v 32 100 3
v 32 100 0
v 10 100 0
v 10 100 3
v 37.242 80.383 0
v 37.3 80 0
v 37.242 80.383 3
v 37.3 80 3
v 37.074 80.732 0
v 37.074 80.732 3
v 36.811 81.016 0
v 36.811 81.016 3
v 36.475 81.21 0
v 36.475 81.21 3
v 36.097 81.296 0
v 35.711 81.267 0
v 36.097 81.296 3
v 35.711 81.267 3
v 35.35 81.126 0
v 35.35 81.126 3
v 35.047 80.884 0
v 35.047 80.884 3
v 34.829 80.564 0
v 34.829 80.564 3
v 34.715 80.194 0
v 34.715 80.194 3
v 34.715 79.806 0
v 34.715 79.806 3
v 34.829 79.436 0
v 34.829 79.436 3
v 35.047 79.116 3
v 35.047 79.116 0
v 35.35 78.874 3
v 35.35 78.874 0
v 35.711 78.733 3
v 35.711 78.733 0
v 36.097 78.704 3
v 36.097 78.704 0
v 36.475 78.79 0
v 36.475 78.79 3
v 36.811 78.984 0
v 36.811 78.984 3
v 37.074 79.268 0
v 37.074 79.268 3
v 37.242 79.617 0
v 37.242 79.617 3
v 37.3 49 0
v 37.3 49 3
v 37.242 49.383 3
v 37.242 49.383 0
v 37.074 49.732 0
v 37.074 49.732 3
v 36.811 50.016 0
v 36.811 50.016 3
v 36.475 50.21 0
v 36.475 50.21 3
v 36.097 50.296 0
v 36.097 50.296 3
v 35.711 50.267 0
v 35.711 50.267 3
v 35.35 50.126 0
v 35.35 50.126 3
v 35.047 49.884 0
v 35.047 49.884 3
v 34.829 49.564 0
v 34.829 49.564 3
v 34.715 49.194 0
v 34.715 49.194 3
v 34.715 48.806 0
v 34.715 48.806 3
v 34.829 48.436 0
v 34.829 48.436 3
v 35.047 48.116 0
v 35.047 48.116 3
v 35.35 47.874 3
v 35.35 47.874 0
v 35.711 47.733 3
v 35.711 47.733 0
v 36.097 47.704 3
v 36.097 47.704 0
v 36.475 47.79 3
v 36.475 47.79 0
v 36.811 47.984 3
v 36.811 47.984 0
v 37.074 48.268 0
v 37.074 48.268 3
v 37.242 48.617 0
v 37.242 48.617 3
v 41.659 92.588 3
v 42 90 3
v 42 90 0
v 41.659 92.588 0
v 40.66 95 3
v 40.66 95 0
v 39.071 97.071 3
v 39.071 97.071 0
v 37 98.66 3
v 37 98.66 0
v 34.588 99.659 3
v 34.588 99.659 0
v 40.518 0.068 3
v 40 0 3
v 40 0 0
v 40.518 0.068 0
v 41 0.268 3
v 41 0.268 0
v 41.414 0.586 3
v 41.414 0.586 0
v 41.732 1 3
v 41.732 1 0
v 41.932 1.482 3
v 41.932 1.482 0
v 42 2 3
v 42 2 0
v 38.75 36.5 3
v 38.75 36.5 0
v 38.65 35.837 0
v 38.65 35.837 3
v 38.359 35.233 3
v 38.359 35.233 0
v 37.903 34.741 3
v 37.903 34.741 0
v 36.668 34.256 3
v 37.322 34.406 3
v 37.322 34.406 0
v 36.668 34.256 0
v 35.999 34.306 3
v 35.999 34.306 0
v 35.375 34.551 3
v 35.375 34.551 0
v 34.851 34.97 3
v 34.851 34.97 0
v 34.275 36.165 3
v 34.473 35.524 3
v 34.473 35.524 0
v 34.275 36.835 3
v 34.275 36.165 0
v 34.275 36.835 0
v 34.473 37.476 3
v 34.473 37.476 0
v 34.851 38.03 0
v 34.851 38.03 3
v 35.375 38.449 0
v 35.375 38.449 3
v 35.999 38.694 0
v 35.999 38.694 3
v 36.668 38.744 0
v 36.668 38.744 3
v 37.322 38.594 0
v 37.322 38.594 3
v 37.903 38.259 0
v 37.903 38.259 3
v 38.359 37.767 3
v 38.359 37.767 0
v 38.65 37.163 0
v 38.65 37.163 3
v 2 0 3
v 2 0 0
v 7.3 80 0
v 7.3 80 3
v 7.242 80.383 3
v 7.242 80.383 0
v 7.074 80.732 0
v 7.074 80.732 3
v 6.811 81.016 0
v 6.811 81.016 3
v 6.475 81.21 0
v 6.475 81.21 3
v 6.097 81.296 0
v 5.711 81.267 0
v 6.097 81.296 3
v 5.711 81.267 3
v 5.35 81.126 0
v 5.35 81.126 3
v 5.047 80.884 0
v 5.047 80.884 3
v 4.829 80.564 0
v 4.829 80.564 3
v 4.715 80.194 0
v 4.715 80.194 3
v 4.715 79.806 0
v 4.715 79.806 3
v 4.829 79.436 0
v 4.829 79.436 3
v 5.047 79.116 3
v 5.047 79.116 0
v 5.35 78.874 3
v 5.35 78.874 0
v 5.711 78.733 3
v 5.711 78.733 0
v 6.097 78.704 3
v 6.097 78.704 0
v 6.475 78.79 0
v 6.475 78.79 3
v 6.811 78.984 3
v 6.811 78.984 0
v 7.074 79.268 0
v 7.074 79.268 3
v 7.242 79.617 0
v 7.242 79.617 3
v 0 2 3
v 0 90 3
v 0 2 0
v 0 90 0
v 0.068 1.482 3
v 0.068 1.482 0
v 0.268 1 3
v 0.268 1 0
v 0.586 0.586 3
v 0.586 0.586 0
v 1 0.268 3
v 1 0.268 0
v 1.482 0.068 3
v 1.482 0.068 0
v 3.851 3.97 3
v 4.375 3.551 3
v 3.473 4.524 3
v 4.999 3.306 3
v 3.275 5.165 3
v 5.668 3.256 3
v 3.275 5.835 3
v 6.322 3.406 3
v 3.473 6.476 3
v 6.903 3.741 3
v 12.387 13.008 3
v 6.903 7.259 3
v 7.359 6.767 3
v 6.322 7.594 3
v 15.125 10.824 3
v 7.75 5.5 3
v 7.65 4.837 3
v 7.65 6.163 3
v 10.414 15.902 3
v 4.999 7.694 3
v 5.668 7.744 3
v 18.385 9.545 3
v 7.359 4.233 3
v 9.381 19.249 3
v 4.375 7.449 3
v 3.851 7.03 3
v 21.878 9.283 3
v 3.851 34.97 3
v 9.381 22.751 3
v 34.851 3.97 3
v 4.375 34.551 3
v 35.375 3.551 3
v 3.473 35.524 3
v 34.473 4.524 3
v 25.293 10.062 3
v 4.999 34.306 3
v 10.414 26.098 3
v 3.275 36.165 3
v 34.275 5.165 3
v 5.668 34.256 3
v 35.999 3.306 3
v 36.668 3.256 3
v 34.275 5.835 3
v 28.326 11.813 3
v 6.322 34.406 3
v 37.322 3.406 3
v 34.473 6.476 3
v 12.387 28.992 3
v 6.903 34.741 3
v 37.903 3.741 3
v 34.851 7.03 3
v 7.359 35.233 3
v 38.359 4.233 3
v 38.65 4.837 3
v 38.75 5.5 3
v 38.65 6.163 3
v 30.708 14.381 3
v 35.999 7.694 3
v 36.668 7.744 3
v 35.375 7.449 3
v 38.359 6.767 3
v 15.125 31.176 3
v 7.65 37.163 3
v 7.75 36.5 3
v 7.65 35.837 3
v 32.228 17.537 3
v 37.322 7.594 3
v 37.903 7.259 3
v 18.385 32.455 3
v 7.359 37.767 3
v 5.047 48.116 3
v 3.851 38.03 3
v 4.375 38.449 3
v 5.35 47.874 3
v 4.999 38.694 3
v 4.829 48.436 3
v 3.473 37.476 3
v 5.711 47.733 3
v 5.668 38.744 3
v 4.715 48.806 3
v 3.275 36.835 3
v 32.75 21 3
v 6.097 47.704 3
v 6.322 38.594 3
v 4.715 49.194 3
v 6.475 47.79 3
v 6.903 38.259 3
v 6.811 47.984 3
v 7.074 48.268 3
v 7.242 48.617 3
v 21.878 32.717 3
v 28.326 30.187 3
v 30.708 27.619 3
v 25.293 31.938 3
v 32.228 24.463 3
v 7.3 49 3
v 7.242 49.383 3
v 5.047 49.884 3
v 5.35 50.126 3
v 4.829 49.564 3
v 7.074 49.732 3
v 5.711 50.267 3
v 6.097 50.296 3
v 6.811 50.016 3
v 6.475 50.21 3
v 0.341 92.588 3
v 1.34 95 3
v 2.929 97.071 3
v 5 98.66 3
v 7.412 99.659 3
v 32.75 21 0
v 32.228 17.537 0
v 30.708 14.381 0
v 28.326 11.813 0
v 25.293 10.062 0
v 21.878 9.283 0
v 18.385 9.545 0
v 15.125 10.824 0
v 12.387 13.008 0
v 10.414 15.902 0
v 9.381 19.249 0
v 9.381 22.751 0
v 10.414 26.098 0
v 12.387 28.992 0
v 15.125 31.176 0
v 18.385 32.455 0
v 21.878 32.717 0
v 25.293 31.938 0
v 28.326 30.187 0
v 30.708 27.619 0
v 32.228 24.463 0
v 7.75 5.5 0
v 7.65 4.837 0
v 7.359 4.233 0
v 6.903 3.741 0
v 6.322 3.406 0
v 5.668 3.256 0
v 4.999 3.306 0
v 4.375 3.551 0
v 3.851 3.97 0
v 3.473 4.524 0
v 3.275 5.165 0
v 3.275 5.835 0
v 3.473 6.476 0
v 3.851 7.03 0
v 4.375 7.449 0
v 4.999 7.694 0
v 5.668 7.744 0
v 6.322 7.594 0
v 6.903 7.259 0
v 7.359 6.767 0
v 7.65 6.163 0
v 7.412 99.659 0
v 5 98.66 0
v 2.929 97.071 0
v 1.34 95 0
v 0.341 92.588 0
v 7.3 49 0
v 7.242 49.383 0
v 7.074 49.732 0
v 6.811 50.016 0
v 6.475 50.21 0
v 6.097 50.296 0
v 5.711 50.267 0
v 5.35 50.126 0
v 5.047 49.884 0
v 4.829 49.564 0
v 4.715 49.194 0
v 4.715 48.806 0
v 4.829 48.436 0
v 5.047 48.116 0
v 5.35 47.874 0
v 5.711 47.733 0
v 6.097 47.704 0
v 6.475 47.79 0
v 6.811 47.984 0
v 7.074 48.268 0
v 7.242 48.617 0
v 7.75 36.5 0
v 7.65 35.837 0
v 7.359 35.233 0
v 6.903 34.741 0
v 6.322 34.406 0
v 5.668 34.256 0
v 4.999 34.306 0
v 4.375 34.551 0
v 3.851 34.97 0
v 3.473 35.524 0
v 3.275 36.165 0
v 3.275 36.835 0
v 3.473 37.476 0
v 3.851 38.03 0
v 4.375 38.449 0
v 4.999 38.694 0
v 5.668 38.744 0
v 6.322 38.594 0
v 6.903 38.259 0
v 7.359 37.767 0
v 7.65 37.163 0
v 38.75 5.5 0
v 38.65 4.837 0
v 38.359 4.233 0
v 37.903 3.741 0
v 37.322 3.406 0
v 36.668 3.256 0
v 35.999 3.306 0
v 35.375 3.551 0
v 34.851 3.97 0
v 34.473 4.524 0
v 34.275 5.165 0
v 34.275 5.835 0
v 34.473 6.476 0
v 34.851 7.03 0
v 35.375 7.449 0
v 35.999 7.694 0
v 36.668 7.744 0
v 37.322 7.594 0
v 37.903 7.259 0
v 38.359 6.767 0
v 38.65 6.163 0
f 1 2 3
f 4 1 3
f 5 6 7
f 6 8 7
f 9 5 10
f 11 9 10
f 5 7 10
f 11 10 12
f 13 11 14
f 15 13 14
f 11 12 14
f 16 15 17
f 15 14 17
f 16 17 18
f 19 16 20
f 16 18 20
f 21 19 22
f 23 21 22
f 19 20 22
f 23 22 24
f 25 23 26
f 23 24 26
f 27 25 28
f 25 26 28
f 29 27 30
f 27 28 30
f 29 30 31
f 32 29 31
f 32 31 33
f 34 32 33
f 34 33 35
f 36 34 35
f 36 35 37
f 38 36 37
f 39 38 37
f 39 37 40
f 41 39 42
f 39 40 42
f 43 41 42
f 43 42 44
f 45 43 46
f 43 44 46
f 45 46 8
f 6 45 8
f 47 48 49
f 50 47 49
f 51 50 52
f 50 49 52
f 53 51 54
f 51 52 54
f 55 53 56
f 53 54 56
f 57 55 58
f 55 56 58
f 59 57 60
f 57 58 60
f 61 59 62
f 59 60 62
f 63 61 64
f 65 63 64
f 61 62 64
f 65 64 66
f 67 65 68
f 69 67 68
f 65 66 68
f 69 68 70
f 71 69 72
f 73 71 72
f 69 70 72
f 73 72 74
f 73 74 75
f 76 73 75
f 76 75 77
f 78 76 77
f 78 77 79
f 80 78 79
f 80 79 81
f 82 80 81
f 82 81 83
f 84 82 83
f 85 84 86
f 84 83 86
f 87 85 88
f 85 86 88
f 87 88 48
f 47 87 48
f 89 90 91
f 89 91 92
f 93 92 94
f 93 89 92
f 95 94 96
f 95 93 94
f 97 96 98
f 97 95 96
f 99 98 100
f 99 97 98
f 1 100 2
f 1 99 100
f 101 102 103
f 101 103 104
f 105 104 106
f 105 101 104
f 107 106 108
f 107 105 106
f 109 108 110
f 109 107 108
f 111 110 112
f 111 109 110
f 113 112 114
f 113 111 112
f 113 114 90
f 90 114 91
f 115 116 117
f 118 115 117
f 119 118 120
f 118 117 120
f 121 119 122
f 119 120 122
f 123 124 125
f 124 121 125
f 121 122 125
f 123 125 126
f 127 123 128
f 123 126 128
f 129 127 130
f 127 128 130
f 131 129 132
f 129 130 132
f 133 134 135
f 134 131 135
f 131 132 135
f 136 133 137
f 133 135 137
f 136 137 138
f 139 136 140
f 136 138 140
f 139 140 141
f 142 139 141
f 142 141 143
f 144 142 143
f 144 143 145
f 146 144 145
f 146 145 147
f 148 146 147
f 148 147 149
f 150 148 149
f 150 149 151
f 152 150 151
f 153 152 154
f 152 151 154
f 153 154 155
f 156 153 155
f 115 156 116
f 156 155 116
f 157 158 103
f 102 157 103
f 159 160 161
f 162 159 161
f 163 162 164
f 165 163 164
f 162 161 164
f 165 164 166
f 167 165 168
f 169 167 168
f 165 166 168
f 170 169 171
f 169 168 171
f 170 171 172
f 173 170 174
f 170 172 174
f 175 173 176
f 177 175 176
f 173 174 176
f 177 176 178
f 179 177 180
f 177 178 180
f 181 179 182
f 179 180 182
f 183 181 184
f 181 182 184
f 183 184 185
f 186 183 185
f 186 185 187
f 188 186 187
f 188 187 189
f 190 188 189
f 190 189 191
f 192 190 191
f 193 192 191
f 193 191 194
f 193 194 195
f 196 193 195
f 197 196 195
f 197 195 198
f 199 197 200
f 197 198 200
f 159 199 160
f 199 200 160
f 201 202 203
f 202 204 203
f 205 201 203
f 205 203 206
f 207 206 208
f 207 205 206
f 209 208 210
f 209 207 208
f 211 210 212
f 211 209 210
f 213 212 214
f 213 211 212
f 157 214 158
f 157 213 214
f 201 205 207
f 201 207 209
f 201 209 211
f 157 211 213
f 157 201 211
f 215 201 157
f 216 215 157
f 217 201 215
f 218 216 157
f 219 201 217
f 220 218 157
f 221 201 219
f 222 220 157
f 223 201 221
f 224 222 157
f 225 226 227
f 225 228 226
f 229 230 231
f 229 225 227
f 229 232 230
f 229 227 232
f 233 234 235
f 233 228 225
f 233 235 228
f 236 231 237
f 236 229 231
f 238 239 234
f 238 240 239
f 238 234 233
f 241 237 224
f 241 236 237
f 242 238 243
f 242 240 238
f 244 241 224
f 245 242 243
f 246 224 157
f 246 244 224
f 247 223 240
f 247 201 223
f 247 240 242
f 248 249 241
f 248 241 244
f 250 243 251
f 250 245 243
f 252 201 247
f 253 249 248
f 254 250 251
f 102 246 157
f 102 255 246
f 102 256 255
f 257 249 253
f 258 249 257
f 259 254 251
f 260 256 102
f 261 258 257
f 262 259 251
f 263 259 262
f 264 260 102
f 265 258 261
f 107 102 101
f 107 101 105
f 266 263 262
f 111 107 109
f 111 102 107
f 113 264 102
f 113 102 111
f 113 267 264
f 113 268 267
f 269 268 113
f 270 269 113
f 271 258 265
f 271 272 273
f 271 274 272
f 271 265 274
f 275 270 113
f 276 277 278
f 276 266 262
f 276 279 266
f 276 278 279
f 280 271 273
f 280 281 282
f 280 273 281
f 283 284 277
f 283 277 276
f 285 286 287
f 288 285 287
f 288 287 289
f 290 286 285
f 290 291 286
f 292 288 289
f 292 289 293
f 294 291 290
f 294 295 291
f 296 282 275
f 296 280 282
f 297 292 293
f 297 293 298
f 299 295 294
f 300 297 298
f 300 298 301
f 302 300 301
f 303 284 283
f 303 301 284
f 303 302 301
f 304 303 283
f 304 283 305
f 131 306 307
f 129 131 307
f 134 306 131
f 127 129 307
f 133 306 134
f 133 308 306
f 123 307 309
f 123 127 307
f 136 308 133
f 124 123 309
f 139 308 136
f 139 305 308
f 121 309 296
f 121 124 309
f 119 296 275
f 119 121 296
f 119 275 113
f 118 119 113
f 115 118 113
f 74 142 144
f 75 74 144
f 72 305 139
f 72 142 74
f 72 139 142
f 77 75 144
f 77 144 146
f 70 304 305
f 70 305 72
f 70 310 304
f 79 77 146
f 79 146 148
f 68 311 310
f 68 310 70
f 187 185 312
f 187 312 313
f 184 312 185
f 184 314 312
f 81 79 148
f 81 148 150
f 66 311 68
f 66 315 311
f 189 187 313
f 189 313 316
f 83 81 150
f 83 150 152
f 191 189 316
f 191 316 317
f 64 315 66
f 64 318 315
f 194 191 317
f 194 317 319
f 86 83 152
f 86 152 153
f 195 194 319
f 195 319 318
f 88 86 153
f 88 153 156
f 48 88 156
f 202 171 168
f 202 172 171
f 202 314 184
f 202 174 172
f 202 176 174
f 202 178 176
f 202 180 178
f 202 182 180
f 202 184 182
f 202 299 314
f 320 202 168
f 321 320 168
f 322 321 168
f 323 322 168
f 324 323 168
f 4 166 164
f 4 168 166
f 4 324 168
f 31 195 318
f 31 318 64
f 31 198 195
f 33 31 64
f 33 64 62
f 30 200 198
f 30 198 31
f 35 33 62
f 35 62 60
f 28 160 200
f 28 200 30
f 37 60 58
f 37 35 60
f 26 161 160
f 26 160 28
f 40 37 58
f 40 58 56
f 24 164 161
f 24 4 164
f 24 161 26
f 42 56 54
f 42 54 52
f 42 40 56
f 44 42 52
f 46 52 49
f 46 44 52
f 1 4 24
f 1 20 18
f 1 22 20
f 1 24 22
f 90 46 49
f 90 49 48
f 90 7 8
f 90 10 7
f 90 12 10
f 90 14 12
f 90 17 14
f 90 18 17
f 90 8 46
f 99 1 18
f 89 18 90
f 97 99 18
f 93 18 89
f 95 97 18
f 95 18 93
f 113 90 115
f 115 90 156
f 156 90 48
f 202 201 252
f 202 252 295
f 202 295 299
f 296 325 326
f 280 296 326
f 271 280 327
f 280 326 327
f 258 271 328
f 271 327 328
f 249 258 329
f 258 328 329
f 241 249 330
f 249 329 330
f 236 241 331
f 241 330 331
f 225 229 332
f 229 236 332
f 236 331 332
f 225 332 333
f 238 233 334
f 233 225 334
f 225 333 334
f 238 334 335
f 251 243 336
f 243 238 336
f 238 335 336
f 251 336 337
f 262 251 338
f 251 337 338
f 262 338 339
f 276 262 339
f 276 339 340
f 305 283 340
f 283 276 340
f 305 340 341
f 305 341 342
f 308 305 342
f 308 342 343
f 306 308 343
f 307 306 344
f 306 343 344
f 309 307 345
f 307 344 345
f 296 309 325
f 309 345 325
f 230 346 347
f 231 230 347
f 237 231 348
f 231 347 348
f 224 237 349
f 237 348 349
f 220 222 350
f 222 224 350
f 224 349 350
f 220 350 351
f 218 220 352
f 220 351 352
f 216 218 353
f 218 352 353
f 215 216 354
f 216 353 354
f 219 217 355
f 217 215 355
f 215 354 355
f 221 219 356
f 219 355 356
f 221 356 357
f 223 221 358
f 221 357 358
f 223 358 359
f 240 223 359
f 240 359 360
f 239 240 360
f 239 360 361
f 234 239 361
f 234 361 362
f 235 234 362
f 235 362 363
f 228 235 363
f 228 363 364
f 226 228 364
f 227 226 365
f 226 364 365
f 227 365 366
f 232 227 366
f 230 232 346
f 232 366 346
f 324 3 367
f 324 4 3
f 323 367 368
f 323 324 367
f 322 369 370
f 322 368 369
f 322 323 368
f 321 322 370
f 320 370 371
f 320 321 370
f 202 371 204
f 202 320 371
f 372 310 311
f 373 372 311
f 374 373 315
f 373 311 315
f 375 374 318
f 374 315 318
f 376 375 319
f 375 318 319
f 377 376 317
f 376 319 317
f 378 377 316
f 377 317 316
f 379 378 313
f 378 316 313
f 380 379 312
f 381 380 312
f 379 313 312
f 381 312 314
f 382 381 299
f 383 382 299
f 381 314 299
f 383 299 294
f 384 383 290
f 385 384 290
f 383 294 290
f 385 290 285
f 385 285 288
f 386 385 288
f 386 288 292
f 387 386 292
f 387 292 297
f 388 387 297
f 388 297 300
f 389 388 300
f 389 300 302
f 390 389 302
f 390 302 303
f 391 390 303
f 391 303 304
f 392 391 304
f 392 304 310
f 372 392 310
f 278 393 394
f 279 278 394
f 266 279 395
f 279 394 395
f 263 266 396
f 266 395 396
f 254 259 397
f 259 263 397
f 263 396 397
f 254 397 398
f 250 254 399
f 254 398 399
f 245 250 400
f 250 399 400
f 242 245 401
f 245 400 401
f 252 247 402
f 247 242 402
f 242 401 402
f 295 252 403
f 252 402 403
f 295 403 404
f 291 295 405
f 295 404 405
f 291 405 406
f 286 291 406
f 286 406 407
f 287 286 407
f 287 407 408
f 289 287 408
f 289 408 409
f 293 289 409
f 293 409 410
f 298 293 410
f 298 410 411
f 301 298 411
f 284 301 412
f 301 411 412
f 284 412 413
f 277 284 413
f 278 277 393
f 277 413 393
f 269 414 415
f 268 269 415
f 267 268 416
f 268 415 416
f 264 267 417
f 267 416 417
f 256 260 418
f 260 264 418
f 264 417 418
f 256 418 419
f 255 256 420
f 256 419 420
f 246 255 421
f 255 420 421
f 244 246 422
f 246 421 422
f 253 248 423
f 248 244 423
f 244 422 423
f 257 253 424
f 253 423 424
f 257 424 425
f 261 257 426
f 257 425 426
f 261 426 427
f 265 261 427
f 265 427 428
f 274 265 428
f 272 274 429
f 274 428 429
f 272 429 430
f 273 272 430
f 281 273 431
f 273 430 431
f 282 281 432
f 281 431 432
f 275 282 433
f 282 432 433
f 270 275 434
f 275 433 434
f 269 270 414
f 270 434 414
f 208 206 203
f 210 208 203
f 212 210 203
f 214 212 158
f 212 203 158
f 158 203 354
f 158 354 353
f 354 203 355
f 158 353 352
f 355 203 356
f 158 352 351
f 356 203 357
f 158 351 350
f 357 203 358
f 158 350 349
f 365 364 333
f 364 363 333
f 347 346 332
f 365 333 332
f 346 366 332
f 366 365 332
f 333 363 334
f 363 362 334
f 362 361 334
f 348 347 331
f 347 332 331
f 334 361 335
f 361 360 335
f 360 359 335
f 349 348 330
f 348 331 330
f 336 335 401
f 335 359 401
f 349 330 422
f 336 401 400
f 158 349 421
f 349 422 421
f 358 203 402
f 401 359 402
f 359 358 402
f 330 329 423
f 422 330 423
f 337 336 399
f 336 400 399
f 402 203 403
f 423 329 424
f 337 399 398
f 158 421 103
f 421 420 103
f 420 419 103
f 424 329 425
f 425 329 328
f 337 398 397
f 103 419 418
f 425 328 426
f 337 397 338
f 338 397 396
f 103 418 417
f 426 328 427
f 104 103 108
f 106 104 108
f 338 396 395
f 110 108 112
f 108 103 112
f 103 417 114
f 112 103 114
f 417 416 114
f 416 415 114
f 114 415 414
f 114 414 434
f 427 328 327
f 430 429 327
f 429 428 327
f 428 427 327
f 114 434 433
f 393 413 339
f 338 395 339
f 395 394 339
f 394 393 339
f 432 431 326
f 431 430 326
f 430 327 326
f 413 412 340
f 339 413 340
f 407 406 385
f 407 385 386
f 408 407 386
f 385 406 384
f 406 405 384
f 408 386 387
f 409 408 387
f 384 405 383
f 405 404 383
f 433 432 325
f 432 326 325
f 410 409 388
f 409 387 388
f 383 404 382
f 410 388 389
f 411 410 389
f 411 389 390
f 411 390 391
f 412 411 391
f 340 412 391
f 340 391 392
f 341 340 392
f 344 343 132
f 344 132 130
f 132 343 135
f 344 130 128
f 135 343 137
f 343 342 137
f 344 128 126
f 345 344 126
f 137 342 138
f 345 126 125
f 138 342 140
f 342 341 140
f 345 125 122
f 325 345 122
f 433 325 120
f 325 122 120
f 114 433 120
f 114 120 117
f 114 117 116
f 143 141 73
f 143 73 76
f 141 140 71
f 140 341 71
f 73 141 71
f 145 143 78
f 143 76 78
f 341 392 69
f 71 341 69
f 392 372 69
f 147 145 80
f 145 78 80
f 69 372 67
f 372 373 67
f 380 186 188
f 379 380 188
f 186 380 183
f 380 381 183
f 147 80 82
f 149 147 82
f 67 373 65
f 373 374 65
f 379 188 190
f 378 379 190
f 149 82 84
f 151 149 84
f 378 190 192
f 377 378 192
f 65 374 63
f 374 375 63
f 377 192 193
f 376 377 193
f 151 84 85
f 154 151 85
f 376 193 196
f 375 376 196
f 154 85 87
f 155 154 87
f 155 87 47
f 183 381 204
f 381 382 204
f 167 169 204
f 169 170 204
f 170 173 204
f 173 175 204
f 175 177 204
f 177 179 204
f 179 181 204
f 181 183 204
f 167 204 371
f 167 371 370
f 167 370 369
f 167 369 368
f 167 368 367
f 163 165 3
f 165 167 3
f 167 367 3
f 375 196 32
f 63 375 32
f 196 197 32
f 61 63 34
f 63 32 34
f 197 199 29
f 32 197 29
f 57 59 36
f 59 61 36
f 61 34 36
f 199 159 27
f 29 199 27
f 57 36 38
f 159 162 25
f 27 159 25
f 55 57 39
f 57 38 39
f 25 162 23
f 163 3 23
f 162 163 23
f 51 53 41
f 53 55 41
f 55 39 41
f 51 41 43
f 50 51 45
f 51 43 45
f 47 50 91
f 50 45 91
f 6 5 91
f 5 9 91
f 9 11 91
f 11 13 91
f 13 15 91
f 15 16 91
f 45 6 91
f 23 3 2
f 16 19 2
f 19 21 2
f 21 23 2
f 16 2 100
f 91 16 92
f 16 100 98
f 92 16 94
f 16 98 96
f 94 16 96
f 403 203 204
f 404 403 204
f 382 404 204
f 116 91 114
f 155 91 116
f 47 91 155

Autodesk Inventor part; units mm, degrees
ref_plane "YZ Plane" through (0, 0, 0) normal (1, 0, 0) x (0, 1, 0)
ref_plane "XZ Plane" through (0, 0, 0) normal (0, 1, 0) x (-1, 0, 0)
ref_plane "XY Plane" through (0, 0, 0) normal (0, 0, 1) x (1, 0, 0)
sketch "スケッチ1" plane through (0, 0, 0) normal (0, 0, 1) x (1, 0, 0)
  line L0 (0, 0) -> (42, 0)
  line L1 (42, 0) -> (42, 100)
  line L2 (42, 100) -> (0, 100)
  line L3 (0, 100) -> (0, 0)
  line L4 (0, 42) -> (42, 42)
  circle A0 centre (5.5, 36.5) radius 2.25
  circle A1 centre (36.5, 36.5) radius 2.25
  circle A2 centre (5.5, 5.5) radius 2.25
  circle A3 centre (36.5, 5.5) radius 2.25
  circle A4 centre (21, 21) radius 11.75
  dimension "d0" = 42
  dimension "d1" = 100
  dimension "d2" = 42
  dimension "d3" = 5.5
  dimension "d4" = 5.5
  dimension "d5" = 5.5
  dimension "d6" = 5.5
  dimension "d7" = 4.5
  dimension "d8" = 4.5
  dimension "d9" = 4.5
  dimension "d10" = 4.5
  dimension "d11" = 23.5
extrude "押し出し1" add sketch "スケッチ1" along normal blind 3
fillet "フィレット1" radius 2 2 edges at (42, 0, 1.5) (0, 0, 1.5)
fillet "フィレット2" radius 10 2 edges at (0, 100, 1.5) (42, 100, 1.5)
sketch "スケッチ2" plane through (0, 0, 3) normal (0, 0, 1) x (1, 0, 0)
  line L0 (0, 90) -> (0, 2) projected
  line L1 (0, 46) -> (42, 46)
  line L2 (42, 2) -> (42, 90) projected
  line L3 (0, 52) -> (42, 52)
  line L4 (6, 52) -> (6, 46)
  line L5 (36, 52) -> (36, 46)
  circle A0 centre (6, 49) radius 1.3
  circle A1 centre (36, 49) radius 1.3
  point P0 (0, 0)
  dimension "d16" = 6
  dimension "d17" = 6
  dimension "d18" = 6
  dimension "d19" = 2.6
  dimension "d20" = 2.6
extrude "押し出し2" cut sketch "スケッチ2" against normal blind 3 contours A0 L4 | L4 A0 | A1 L5 | L5 A1
sketch "スケッチ3" plane through (0, 0, 3) normal (0, 0, 1) x (1, 0, 0)
  line L0 (0, 90) -> (0, 2)
  line L1 (0, 46) -> (42, 46)
  line L2 (42, 2) -> (42, 90)
  line L3 (0, 52) -> (42, 52)
  line L4 (6, 52) -> (6, 46)
  line L5 (36, 52) -> (36, 46)
  circle A0 centre (6, 49) radius 1.3
  circle A1 centre (36, 49) radius 1.3
  line L6 (0, 90) -> (0, 2) projected
  line L7 (0, 77) -> (42, 77)
  line L8 (42, 2) -> (42, 90) projected
  line L9 (0, 83) -> (42, 83)
  circle A2 centre (6, 80) radius 1.3
  circle A3 centre (36, 80) radius 1.3
  point P0 (0, 0)
  point P1 (0, 0)
  dimension "d23" = 6
  dimension "d24" = 6
  dimension "d25" = 6
  dimension "d26" = 2.6
  dimension "d27" = 2.6
  dimension "d28" = 25
  dimension "d29" = 6
  dimension "d30" = 2.6
  dimension "d31" = 3
  dimension "d32" = 2.6
extrude "押し出し3" cut sketch "スケッチ3" against normal blind 10 contours A2 | A3
